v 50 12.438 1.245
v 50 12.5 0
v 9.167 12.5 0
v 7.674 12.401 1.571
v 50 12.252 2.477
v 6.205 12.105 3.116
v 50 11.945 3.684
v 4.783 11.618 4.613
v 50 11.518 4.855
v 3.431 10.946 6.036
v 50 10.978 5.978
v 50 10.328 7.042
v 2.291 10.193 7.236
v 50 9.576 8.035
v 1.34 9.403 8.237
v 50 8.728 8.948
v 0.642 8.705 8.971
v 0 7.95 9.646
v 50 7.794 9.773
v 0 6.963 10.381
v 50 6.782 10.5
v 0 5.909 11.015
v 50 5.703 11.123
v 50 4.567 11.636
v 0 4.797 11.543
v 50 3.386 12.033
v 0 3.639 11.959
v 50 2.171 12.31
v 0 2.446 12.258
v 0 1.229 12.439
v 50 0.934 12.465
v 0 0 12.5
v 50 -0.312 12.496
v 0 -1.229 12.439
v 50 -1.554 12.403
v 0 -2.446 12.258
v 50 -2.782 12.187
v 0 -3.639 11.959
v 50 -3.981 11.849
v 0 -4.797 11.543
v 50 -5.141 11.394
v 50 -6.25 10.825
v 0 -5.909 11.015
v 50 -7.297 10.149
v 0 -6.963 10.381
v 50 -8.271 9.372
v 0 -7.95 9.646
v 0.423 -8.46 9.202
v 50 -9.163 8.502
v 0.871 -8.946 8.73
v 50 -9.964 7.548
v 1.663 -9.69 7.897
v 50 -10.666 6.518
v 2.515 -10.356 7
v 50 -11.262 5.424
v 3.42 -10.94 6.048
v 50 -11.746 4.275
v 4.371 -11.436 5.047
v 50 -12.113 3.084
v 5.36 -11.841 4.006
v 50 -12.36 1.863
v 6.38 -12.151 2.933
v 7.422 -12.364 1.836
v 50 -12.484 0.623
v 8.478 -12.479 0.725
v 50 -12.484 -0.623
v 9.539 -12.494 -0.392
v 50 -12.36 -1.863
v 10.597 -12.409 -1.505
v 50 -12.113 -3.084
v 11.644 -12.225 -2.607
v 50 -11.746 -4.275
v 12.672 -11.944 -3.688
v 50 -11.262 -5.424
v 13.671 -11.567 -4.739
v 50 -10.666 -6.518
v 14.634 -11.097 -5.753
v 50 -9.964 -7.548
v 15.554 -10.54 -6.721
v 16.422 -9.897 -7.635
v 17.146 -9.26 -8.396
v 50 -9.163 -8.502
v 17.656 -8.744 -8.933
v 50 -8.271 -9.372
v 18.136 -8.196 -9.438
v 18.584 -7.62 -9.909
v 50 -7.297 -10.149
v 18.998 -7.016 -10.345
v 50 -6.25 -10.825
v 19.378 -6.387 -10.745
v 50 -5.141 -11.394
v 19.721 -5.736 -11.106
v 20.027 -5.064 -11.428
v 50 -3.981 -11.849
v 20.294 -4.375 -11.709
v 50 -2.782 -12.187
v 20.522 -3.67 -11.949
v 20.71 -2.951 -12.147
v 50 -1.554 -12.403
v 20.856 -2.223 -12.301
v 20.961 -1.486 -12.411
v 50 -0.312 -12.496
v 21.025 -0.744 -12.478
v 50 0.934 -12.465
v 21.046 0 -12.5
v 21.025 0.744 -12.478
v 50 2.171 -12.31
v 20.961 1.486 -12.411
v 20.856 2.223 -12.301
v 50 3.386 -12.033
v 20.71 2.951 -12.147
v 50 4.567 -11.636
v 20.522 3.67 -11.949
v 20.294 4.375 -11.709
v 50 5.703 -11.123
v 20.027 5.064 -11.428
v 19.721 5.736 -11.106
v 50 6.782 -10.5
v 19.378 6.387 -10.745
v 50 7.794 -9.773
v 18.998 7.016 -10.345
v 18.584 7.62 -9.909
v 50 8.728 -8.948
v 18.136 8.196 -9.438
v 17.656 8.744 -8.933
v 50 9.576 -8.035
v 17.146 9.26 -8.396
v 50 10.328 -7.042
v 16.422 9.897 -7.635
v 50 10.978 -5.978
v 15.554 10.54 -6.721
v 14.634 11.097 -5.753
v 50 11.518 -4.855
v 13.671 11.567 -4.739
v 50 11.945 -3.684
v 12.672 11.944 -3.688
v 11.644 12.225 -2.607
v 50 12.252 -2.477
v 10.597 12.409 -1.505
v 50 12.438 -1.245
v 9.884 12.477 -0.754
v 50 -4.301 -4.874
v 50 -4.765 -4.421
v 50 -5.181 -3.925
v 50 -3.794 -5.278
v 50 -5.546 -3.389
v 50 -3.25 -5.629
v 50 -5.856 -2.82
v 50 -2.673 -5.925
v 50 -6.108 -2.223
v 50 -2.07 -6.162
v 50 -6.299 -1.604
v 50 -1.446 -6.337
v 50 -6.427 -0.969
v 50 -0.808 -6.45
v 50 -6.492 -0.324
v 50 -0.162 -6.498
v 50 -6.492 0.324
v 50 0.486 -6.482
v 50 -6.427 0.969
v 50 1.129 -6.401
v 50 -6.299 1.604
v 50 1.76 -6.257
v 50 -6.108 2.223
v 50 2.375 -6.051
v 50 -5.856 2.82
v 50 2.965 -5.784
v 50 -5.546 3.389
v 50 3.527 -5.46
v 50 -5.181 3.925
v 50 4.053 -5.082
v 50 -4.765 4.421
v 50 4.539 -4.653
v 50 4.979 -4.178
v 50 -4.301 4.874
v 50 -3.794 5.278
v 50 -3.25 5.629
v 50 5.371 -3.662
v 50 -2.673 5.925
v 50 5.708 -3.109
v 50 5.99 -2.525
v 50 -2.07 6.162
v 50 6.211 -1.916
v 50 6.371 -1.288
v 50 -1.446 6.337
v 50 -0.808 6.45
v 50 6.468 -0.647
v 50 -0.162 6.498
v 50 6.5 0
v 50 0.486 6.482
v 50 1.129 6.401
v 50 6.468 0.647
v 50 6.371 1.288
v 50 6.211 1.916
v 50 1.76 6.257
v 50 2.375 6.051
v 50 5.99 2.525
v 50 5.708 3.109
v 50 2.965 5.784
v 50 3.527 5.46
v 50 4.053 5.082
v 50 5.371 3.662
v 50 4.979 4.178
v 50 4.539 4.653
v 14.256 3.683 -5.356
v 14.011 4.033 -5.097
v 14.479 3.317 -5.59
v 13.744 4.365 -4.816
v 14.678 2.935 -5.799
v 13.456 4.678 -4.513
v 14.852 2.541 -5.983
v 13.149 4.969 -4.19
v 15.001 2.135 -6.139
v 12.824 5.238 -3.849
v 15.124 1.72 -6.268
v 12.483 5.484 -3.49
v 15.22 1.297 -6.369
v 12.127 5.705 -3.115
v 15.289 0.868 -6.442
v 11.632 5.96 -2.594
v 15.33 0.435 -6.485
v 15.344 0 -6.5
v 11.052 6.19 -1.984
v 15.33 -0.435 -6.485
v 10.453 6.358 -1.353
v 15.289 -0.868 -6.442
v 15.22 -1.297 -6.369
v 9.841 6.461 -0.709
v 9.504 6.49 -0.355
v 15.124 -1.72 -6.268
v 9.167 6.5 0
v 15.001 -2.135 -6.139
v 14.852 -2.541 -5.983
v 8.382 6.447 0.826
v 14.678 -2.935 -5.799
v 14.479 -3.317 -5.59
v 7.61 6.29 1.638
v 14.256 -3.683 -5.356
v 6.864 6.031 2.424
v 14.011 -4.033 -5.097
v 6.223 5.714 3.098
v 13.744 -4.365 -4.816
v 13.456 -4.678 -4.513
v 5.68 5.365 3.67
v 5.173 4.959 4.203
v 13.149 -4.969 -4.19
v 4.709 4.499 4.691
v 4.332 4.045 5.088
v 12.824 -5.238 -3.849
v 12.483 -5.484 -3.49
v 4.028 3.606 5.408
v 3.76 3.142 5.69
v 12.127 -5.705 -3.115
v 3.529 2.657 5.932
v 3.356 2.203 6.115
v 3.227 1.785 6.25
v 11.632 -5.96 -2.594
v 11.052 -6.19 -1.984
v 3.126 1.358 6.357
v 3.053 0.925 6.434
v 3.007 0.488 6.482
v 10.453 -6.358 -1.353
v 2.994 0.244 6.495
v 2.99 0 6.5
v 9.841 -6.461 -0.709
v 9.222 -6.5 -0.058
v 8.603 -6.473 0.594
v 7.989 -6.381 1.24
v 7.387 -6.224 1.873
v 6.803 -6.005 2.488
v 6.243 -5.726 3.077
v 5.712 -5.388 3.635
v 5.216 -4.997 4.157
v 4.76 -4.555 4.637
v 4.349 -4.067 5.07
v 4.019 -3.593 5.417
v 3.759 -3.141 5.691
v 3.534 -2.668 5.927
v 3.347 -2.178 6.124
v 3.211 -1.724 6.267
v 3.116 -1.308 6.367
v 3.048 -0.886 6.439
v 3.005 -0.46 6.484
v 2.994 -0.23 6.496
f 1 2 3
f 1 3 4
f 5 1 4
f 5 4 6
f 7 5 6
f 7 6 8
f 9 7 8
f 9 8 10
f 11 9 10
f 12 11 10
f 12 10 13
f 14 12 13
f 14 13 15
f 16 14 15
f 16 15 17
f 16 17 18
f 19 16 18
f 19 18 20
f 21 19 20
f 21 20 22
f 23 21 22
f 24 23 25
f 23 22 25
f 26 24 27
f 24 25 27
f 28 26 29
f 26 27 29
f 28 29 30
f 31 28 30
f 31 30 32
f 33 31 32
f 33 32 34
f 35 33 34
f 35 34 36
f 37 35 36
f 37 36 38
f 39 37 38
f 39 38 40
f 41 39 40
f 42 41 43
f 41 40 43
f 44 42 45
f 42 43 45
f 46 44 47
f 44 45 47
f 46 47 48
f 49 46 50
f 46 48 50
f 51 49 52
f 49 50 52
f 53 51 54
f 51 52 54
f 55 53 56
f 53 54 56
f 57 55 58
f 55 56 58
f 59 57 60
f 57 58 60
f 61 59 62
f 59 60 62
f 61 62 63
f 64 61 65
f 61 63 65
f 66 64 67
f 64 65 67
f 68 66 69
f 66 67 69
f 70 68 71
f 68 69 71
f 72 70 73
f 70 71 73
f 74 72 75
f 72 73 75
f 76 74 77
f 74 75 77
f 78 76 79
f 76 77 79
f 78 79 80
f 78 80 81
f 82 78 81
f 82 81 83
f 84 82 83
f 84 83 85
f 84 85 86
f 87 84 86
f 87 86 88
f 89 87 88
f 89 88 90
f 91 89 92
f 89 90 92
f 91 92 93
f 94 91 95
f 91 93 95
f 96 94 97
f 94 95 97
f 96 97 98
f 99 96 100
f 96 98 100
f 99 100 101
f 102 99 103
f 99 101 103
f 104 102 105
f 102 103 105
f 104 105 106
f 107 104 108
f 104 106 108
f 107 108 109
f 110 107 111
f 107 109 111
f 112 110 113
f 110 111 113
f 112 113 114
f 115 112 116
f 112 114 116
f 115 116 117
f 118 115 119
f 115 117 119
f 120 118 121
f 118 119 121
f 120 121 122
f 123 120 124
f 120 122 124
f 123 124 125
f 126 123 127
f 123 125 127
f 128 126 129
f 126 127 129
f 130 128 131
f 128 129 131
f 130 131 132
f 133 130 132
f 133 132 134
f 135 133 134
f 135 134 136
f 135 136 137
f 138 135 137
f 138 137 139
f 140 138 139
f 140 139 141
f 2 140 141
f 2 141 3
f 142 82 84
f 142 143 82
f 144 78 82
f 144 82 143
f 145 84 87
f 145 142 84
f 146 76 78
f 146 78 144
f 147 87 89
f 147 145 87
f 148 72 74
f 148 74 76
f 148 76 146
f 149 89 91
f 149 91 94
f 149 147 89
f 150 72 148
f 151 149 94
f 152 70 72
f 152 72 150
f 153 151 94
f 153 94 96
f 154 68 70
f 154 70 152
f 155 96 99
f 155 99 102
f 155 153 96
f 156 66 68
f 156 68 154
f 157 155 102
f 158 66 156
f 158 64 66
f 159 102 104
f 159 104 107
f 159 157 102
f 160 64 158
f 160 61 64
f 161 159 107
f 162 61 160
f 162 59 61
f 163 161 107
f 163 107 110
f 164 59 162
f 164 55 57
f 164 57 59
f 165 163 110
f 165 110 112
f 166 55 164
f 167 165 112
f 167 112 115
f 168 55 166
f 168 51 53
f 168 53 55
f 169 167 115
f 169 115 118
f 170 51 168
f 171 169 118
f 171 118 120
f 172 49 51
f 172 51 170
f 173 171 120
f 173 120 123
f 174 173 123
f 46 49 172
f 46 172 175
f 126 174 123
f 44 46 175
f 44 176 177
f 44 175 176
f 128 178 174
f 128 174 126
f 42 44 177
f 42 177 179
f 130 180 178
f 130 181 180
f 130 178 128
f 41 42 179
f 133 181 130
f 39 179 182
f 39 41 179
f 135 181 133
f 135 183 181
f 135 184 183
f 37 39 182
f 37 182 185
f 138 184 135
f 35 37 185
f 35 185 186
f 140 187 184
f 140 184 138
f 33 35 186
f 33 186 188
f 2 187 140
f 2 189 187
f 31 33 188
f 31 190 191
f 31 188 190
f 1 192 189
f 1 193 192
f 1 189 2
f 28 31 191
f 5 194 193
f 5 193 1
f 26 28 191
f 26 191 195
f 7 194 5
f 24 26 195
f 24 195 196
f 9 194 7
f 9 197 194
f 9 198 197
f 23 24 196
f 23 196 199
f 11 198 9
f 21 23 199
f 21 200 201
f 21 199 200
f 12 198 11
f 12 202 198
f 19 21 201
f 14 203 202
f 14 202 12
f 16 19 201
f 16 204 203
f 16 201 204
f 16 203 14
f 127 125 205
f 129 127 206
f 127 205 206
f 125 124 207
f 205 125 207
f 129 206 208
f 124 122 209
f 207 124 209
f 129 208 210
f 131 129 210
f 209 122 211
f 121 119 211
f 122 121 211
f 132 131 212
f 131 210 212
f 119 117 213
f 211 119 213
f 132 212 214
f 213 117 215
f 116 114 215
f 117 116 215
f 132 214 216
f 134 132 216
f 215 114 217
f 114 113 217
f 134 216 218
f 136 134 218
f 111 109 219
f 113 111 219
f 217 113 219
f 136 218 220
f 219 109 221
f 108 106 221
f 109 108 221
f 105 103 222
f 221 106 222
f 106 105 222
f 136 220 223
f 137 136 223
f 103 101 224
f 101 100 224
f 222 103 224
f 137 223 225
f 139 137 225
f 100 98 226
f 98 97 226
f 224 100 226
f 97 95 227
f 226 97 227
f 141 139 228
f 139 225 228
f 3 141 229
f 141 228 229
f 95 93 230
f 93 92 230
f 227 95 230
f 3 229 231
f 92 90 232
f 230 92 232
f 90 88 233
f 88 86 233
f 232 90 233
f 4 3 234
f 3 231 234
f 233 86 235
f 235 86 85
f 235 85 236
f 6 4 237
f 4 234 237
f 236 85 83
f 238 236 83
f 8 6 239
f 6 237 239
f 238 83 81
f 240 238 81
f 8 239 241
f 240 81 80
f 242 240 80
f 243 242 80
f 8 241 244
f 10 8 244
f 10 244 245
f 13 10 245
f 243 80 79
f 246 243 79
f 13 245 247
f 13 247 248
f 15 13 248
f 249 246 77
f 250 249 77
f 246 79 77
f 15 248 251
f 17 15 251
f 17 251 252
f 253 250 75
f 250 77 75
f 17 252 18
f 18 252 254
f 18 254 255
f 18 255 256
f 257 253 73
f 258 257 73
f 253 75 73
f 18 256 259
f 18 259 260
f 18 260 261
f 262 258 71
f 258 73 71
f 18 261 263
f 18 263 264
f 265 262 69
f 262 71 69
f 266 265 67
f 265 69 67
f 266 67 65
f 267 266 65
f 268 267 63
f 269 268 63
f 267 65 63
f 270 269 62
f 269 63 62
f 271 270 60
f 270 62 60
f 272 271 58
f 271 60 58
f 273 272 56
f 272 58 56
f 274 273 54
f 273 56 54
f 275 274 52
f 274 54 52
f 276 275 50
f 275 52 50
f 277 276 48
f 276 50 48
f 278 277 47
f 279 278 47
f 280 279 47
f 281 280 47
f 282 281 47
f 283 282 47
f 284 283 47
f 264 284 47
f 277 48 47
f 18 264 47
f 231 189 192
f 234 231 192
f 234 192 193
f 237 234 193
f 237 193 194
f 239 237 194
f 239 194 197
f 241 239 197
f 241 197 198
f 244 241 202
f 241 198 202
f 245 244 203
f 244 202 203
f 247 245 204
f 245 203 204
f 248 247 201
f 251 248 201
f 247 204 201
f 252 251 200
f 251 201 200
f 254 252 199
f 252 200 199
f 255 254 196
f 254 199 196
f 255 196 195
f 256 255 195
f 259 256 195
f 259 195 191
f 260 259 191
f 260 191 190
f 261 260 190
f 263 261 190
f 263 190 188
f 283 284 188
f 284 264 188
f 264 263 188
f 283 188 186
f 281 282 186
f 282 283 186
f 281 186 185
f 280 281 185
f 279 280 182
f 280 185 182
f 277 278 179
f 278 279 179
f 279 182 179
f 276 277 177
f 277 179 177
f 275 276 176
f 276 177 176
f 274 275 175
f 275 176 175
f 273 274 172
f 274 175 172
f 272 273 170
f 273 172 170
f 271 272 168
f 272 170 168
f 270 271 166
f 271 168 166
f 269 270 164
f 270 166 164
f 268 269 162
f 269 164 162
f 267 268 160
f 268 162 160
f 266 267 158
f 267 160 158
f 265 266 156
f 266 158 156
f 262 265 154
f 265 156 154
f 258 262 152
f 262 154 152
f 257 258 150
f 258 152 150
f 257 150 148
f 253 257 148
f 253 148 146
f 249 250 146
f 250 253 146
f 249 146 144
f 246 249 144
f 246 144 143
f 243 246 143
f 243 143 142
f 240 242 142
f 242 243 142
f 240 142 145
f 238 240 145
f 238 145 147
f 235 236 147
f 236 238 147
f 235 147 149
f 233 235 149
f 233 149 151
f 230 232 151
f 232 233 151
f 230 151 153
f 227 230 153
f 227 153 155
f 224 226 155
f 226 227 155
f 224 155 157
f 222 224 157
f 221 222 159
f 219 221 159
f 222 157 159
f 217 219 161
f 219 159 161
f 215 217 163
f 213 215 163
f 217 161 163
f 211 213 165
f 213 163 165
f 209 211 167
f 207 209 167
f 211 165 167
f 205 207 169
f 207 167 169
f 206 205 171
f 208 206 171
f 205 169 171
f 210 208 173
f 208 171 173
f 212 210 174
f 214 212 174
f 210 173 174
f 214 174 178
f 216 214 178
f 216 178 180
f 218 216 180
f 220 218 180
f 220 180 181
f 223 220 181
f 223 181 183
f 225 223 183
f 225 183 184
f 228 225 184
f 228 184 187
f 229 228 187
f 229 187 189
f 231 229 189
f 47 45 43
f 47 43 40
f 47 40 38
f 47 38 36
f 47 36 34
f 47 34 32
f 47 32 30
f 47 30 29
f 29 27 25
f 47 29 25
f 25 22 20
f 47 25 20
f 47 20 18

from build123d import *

# Parameters (mm, degrees)
F0_R          = 12.5
F1_DEPTH      = 50
F2_R          = 6.5
F3_DEPTH      = 50
F5_DEPTH      = 12.501
F5_DEPTH_BACK = 12.501


with BuildPart() as f1:
    # F0 (on Right) → F1 (new body)
    with BuildSketch(Plane.YZ):
        Circle(F0_R)
    extrude(amount=F1_DEPTH)

    # F2 (on face) → F3 (cut, through all)
    with BuildSketch(Plane.YZ.offset(50)):
        Circle(F2_R)
    extrude(amount=-F3_DEPTH, mode=Mode.SUBTRACT)

    # F4 (on Front) → F5 (cut, two sides)
    with BuildSketch(Plane.XZ) as f5_sk:
        Polygon((0, -12.5), (21.0457462817, -12.5), (0, 9.6463374794), align=None)
    extrude(amount=-F5_DEPTH, mode=Mode.SUBTRACT)
    extrude(f5_sk.sketch, amount=F5_DEPTH_BACK, mode=Mode.SUBTRACT)


solid = f1.part
